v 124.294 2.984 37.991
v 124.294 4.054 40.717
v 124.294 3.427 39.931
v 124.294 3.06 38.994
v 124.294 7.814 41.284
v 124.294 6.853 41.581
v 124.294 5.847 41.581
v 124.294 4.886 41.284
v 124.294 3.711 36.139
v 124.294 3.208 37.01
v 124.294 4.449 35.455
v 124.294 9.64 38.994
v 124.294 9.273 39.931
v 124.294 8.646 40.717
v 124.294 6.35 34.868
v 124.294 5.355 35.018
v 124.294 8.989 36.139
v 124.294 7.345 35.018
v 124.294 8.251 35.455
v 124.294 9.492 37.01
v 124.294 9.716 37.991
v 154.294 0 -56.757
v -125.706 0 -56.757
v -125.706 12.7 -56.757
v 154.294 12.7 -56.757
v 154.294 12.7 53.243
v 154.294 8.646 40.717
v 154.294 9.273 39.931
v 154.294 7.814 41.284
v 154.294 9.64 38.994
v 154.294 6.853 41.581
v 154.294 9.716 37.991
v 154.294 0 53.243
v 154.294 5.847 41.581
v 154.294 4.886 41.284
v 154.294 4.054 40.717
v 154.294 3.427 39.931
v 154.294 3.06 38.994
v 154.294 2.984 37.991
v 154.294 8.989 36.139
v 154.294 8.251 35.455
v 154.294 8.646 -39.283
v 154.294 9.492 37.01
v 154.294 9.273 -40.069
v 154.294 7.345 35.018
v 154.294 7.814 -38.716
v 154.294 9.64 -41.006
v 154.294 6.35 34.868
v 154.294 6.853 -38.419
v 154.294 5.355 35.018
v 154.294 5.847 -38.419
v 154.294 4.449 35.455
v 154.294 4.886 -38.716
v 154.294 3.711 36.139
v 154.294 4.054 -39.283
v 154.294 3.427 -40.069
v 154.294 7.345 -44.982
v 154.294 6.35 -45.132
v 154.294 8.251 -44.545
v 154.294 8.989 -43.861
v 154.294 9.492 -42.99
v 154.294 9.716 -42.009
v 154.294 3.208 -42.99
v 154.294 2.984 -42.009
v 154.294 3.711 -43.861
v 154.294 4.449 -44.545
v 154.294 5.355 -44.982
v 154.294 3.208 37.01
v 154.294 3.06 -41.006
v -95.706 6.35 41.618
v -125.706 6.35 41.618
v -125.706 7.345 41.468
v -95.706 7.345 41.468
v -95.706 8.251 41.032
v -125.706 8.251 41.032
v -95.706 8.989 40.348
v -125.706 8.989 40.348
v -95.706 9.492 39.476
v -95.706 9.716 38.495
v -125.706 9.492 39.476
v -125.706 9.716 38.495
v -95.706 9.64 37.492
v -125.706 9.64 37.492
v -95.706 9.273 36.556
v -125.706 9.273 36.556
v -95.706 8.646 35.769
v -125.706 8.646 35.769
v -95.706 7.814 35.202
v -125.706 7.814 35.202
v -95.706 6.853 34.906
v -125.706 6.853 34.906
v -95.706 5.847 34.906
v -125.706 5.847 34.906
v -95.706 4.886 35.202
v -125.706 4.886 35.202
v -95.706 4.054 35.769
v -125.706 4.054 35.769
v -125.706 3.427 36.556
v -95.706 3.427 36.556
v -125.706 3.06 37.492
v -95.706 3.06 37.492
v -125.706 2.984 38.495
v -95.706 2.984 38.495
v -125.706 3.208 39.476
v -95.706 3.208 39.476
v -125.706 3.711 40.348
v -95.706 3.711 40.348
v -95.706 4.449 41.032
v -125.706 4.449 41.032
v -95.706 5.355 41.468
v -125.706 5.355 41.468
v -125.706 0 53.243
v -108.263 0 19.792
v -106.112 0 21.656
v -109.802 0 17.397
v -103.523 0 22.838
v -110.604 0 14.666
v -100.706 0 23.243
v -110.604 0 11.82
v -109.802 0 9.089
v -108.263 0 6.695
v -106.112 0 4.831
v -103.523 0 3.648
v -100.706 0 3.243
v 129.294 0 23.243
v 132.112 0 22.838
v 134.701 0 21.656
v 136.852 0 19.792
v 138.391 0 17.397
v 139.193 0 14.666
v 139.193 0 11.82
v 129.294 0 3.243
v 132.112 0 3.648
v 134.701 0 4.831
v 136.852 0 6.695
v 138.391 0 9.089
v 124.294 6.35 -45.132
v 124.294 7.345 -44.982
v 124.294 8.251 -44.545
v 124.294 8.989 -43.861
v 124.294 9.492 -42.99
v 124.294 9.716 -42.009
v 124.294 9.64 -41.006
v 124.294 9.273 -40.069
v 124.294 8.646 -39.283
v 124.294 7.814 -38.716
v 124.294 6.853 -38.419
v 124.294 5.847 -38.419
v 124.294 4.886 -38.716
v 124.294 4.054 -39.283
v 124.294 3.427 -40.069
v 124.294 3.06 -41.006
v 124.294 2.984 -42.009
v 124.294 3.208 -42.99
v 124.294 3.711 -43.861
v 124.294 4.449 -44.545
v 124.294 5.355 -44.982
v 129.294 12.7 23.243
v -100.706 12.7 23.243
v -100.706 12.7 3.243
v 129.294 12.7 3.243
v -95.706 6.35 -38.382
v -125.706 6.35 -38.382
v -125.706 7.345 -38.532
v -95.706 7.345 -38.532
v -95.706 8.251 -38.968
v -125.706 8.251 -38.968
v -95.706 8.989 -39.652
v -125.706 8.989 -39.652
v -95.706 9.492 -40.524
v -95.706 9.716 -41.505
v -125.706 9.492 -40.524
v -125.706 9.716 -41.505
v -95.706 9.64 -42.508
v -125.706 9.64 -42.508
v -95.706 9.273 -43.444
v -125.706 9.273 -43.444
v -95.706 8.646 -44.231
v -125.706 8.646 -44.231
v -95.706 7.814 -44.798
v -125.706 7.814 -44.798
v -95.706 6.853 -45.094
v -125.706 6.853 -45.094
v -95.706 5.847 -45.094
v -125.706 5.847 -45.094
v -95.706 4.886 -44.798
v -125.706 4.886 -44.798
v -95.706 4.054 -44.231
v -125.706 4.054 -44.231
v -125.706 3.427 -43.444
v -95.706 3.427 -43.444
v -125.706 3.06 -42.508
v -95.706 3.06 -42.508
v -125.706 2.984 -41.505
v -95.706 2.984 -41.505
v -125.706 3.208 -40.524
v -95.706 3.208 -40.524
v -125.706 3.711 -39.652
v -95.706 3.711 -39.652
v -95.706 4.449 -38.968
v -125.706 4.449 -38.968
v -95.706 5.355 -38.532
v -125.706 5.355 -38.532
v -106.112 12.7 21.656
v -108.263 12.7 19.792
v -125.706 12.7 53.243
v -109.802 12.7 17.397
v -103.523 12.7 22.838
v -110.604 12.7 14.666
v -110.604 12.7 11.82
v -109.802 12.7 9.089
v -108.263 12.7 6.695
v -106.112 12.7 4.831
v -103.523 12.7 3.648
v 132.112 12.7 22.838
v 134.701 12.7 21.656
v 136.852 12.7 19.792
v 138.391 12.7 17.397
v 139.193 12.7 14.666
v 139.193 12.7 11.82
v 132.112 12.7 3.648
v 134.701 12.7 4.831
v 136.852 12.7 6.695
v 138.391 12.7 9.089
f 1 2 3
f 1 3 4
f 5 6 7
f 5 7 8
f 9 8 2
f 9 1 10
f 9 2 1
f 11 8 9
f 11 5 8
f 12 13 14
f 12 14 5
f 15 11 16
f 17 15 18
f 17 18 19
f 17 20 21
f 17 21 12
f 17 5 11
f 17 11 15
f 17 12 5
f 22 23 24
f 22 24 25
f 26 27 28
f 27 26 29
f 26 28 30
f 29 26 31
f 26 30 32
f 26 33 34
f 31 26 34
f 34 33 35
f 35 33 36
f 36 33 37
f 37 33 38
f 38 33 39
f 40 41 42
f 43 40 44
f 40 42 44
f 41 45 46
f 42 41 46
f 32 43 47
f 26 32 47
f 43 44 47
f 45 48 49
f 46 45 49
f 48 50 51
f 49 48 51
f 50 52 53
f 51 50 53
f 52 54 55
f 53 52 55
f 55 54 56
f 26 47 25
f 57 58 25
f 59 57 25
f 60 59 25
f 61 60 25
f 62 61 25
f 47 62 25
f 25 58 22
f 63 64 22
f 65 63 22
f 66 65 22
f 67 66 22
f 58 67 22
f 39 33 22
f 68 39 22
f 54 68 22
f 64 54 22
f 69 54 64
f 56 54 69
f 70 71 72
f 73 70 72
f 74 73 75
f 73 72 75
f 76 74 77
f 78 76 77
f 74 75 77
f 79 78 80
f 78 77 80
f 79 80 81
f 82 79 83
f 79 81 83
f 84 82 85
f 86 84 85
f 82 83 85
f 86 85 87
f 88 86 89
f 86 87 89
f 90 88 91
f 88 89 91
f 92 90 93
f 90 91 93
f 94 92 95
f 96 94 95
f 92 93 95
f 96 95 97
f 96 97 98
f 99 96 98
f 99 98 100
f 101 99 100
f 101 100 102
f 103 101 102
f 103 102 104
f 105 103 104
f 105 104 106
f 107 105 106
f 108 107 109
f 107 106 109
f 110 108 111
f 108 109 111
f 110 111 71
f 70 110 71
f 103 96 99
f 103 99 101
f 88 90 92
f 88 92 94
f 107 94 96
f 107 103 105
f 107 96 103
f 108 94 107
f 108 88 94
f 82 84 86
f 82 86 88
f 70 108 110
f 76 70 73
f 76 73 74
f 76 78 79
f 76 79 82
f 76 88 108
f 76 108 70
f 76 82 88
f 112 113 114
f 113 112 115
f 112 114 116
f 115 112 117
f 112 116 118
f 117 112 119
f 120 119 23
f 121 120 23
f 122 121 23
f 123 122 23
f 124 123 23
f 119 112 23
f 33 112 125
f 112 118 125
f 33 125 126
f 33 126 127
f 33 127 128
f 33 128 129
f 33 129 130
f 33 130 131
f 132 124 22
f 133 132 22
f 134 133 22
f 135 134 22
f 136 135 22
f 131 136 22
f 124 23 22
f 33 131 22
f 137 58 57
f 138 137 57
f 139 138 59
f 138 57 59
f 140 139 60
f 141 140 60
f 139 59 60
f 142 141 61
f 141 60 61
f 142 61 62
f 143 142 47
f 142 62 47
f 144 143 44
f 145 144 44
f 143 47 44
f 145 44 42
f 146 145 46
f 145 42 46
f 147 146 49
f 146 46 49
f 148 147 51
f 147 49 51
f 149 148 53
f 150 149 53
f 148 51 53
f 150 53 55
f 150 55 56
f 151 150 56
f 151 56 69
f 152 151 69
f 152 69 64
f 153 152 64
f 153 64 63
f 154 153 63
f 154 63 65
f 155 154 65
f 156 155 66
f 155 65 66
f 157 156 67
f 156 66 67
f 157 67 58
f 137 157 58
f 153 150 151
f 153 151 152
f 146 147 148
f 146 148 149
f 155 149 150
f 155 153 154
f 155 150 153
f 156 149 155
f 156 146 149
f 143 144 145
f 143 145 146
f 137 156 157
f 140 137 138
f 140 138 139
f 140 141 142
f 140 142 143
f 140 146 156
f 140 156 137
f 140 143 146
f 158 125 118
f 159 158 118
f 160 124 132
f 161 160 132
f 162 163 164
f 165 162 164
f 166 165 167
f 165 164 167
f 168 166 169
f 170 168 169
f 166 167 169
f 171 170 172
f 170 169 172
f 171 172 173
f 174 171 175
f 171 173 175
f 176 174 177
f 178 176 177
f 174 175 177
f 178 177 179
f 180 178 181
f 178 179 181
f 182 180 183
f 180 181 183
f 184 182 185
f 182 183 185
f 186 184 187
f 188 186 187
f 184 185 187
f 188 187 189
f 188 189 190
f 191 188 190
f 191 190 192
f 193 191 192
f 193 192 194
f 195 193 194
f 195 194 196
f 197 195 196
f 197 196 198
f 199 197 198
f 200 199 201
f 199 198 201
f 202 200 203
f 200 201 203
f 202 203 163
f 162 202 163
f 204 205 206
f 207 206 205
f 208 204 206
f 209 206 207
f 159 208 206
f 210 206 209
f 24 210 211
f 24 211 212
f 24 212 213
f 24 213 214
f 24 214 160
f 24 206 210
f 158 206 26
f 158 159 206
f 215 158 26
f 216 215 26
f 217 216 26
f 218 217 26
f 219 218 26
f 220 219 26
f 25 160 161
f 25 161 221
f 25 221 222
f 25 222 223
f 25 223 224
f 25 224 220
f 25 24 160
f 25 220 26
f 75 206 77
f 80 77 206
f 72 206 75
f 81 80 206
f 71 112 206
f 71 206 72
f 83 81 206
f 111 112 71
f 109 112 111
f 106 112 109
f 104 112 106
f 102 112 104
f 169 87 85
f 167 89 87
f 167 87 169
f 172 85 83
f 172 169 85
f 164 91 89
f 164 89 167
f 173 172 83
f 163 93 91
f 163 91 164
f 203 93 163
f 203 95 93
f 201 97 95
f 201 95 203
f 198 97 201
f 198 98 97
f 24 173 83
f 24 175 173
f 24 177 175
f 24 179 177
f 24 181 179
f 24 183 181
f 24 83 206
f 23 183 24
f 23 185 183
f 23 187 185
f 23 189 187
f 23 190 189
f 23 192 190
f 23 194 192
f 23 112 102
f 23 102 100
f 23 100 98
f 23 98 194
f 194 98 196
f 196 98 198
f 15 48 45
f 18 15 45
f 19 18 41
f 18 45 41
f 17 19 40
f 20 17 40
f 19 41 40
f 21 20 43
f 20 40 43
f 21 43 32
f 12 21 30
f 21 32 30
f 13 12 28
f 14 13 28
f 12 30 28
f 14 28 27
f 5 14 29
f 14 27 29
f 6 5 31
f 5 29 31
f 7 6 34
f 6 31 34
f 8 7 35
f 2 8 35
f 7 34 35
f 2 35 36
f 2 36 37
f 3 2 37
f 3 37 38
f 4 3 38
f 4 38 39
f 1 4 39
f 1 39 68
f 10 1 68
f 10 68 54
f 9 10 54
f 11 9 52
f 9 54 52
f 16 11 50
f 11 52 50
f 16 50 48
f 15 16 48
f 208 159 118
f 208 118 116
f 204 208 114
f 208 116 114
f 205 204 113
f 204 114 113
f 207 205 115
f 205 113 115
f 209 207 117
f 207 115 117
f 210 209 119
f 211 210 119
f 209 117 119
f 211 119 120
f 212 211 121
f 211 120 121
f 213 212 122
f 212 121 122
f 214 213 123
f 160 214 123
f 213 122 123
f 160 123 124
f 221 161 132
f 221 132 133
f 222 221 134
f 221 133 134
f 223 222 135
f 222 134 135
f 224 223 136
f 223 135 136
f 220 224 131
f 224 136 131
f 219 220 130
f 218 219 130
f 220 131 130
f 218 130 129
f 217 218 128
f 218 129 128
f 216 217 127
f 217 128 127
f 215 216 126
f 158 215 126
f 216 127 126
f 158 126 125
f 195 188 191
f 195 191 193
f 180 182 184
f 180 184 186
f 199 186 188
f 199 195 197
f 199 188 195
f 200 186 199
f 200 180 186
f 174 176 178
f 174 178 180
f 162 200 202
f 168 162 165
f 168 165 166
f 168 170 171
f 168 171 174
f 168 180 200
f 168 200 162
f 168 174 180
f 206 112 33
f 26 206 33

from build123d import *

# Parameters (mm, degrees)
CROQUIS1_W              = 280
CROQUIS1_H              = 110
SALIENTE_EXTRUIR1_DEPTH = 12.7
CORTAR_EXTRUIR2_DEPTH   = 20
CROQUIS5_R              = 3.375
CORTAR_EXTRUIR5_DEPTH   = 30
CROQUIS6_R              = 3.375
CORTAR_EXTRUIR6_DEPTH   = 30


with BuildPart() as part:
    # Croquis1 → Saliente-Extruir1 (new body)
    with BuildSketch(Plane(origin=(0, 0, 0), x_dir=(1, 0, 0), z_dir=(0, 1, 0))):
        with Locations((14.294294294, 1.756756757)):
            Rectangle(CROQUIS1_W, CROQUIS1_H)
    extrude(amount=SALIENTE_EXTRUIR1_DEPTH)

    # Croquis2 → Cortar-Extruir2 (cut)
    with BuildSketch(Plane(origin=(0, 0, 0), x_dir=(1, 0, 0), z_dir=(0, 1, 0))):
        with BuildLine():
            Line((-100.705705706, -3.243243243), (129.294294294, -3.243243243))
            ThreePointArc((129.294294294, -3.243243243), (139.294294294, -13.243243243), (129.294294294, -23.243243243))
            Line((129.294294294, -23.243243243), (-100.705705706, -23.243243243))
            ThreePointArc((-100.705705706, -23.243243243), (-110.705705706, -13.243243243), (-100.705705706, -3.243243243))
        make_face()
    extrude(amount=CORTAR_EXTRUIR2_DEPTH, mode=Mode.SUBTRACT)

    # Croquis5 → Cortar-Extruir5 (cut)
    with BuildSketch(Plane.ZY.offset(125.705705706)):
        with Locations((38.243243243, 6.35)):
            Circle(CROQUIS5_R)
        with Locations((-41.756756757, 6.35)):
            Circle(CROQUIS5_R)
    extrude(amount=-CORTAR_EXTRUIR5_DEPTH, mode=Mode.SUBTRACT)

    # Croquis6 → Cortar-Extruir6 (cut)
    with BuildSketch(Plane(origin=(154.294294294, 0, 0), x_dir=(0, 0, -1), z_dir=(1, 0, 0))):
        with Locations((41.756756757, 6.35)):
            Circle(CROQUIS6_R)
        with Locations((-38.243243243, 6.35)):
            Circle(CROQUIS6_R)
    extrude(amount=-CORTAR_EXTRUIR6_DEPTH, mode=Mode.SUBTRACT)


solid = part.part
